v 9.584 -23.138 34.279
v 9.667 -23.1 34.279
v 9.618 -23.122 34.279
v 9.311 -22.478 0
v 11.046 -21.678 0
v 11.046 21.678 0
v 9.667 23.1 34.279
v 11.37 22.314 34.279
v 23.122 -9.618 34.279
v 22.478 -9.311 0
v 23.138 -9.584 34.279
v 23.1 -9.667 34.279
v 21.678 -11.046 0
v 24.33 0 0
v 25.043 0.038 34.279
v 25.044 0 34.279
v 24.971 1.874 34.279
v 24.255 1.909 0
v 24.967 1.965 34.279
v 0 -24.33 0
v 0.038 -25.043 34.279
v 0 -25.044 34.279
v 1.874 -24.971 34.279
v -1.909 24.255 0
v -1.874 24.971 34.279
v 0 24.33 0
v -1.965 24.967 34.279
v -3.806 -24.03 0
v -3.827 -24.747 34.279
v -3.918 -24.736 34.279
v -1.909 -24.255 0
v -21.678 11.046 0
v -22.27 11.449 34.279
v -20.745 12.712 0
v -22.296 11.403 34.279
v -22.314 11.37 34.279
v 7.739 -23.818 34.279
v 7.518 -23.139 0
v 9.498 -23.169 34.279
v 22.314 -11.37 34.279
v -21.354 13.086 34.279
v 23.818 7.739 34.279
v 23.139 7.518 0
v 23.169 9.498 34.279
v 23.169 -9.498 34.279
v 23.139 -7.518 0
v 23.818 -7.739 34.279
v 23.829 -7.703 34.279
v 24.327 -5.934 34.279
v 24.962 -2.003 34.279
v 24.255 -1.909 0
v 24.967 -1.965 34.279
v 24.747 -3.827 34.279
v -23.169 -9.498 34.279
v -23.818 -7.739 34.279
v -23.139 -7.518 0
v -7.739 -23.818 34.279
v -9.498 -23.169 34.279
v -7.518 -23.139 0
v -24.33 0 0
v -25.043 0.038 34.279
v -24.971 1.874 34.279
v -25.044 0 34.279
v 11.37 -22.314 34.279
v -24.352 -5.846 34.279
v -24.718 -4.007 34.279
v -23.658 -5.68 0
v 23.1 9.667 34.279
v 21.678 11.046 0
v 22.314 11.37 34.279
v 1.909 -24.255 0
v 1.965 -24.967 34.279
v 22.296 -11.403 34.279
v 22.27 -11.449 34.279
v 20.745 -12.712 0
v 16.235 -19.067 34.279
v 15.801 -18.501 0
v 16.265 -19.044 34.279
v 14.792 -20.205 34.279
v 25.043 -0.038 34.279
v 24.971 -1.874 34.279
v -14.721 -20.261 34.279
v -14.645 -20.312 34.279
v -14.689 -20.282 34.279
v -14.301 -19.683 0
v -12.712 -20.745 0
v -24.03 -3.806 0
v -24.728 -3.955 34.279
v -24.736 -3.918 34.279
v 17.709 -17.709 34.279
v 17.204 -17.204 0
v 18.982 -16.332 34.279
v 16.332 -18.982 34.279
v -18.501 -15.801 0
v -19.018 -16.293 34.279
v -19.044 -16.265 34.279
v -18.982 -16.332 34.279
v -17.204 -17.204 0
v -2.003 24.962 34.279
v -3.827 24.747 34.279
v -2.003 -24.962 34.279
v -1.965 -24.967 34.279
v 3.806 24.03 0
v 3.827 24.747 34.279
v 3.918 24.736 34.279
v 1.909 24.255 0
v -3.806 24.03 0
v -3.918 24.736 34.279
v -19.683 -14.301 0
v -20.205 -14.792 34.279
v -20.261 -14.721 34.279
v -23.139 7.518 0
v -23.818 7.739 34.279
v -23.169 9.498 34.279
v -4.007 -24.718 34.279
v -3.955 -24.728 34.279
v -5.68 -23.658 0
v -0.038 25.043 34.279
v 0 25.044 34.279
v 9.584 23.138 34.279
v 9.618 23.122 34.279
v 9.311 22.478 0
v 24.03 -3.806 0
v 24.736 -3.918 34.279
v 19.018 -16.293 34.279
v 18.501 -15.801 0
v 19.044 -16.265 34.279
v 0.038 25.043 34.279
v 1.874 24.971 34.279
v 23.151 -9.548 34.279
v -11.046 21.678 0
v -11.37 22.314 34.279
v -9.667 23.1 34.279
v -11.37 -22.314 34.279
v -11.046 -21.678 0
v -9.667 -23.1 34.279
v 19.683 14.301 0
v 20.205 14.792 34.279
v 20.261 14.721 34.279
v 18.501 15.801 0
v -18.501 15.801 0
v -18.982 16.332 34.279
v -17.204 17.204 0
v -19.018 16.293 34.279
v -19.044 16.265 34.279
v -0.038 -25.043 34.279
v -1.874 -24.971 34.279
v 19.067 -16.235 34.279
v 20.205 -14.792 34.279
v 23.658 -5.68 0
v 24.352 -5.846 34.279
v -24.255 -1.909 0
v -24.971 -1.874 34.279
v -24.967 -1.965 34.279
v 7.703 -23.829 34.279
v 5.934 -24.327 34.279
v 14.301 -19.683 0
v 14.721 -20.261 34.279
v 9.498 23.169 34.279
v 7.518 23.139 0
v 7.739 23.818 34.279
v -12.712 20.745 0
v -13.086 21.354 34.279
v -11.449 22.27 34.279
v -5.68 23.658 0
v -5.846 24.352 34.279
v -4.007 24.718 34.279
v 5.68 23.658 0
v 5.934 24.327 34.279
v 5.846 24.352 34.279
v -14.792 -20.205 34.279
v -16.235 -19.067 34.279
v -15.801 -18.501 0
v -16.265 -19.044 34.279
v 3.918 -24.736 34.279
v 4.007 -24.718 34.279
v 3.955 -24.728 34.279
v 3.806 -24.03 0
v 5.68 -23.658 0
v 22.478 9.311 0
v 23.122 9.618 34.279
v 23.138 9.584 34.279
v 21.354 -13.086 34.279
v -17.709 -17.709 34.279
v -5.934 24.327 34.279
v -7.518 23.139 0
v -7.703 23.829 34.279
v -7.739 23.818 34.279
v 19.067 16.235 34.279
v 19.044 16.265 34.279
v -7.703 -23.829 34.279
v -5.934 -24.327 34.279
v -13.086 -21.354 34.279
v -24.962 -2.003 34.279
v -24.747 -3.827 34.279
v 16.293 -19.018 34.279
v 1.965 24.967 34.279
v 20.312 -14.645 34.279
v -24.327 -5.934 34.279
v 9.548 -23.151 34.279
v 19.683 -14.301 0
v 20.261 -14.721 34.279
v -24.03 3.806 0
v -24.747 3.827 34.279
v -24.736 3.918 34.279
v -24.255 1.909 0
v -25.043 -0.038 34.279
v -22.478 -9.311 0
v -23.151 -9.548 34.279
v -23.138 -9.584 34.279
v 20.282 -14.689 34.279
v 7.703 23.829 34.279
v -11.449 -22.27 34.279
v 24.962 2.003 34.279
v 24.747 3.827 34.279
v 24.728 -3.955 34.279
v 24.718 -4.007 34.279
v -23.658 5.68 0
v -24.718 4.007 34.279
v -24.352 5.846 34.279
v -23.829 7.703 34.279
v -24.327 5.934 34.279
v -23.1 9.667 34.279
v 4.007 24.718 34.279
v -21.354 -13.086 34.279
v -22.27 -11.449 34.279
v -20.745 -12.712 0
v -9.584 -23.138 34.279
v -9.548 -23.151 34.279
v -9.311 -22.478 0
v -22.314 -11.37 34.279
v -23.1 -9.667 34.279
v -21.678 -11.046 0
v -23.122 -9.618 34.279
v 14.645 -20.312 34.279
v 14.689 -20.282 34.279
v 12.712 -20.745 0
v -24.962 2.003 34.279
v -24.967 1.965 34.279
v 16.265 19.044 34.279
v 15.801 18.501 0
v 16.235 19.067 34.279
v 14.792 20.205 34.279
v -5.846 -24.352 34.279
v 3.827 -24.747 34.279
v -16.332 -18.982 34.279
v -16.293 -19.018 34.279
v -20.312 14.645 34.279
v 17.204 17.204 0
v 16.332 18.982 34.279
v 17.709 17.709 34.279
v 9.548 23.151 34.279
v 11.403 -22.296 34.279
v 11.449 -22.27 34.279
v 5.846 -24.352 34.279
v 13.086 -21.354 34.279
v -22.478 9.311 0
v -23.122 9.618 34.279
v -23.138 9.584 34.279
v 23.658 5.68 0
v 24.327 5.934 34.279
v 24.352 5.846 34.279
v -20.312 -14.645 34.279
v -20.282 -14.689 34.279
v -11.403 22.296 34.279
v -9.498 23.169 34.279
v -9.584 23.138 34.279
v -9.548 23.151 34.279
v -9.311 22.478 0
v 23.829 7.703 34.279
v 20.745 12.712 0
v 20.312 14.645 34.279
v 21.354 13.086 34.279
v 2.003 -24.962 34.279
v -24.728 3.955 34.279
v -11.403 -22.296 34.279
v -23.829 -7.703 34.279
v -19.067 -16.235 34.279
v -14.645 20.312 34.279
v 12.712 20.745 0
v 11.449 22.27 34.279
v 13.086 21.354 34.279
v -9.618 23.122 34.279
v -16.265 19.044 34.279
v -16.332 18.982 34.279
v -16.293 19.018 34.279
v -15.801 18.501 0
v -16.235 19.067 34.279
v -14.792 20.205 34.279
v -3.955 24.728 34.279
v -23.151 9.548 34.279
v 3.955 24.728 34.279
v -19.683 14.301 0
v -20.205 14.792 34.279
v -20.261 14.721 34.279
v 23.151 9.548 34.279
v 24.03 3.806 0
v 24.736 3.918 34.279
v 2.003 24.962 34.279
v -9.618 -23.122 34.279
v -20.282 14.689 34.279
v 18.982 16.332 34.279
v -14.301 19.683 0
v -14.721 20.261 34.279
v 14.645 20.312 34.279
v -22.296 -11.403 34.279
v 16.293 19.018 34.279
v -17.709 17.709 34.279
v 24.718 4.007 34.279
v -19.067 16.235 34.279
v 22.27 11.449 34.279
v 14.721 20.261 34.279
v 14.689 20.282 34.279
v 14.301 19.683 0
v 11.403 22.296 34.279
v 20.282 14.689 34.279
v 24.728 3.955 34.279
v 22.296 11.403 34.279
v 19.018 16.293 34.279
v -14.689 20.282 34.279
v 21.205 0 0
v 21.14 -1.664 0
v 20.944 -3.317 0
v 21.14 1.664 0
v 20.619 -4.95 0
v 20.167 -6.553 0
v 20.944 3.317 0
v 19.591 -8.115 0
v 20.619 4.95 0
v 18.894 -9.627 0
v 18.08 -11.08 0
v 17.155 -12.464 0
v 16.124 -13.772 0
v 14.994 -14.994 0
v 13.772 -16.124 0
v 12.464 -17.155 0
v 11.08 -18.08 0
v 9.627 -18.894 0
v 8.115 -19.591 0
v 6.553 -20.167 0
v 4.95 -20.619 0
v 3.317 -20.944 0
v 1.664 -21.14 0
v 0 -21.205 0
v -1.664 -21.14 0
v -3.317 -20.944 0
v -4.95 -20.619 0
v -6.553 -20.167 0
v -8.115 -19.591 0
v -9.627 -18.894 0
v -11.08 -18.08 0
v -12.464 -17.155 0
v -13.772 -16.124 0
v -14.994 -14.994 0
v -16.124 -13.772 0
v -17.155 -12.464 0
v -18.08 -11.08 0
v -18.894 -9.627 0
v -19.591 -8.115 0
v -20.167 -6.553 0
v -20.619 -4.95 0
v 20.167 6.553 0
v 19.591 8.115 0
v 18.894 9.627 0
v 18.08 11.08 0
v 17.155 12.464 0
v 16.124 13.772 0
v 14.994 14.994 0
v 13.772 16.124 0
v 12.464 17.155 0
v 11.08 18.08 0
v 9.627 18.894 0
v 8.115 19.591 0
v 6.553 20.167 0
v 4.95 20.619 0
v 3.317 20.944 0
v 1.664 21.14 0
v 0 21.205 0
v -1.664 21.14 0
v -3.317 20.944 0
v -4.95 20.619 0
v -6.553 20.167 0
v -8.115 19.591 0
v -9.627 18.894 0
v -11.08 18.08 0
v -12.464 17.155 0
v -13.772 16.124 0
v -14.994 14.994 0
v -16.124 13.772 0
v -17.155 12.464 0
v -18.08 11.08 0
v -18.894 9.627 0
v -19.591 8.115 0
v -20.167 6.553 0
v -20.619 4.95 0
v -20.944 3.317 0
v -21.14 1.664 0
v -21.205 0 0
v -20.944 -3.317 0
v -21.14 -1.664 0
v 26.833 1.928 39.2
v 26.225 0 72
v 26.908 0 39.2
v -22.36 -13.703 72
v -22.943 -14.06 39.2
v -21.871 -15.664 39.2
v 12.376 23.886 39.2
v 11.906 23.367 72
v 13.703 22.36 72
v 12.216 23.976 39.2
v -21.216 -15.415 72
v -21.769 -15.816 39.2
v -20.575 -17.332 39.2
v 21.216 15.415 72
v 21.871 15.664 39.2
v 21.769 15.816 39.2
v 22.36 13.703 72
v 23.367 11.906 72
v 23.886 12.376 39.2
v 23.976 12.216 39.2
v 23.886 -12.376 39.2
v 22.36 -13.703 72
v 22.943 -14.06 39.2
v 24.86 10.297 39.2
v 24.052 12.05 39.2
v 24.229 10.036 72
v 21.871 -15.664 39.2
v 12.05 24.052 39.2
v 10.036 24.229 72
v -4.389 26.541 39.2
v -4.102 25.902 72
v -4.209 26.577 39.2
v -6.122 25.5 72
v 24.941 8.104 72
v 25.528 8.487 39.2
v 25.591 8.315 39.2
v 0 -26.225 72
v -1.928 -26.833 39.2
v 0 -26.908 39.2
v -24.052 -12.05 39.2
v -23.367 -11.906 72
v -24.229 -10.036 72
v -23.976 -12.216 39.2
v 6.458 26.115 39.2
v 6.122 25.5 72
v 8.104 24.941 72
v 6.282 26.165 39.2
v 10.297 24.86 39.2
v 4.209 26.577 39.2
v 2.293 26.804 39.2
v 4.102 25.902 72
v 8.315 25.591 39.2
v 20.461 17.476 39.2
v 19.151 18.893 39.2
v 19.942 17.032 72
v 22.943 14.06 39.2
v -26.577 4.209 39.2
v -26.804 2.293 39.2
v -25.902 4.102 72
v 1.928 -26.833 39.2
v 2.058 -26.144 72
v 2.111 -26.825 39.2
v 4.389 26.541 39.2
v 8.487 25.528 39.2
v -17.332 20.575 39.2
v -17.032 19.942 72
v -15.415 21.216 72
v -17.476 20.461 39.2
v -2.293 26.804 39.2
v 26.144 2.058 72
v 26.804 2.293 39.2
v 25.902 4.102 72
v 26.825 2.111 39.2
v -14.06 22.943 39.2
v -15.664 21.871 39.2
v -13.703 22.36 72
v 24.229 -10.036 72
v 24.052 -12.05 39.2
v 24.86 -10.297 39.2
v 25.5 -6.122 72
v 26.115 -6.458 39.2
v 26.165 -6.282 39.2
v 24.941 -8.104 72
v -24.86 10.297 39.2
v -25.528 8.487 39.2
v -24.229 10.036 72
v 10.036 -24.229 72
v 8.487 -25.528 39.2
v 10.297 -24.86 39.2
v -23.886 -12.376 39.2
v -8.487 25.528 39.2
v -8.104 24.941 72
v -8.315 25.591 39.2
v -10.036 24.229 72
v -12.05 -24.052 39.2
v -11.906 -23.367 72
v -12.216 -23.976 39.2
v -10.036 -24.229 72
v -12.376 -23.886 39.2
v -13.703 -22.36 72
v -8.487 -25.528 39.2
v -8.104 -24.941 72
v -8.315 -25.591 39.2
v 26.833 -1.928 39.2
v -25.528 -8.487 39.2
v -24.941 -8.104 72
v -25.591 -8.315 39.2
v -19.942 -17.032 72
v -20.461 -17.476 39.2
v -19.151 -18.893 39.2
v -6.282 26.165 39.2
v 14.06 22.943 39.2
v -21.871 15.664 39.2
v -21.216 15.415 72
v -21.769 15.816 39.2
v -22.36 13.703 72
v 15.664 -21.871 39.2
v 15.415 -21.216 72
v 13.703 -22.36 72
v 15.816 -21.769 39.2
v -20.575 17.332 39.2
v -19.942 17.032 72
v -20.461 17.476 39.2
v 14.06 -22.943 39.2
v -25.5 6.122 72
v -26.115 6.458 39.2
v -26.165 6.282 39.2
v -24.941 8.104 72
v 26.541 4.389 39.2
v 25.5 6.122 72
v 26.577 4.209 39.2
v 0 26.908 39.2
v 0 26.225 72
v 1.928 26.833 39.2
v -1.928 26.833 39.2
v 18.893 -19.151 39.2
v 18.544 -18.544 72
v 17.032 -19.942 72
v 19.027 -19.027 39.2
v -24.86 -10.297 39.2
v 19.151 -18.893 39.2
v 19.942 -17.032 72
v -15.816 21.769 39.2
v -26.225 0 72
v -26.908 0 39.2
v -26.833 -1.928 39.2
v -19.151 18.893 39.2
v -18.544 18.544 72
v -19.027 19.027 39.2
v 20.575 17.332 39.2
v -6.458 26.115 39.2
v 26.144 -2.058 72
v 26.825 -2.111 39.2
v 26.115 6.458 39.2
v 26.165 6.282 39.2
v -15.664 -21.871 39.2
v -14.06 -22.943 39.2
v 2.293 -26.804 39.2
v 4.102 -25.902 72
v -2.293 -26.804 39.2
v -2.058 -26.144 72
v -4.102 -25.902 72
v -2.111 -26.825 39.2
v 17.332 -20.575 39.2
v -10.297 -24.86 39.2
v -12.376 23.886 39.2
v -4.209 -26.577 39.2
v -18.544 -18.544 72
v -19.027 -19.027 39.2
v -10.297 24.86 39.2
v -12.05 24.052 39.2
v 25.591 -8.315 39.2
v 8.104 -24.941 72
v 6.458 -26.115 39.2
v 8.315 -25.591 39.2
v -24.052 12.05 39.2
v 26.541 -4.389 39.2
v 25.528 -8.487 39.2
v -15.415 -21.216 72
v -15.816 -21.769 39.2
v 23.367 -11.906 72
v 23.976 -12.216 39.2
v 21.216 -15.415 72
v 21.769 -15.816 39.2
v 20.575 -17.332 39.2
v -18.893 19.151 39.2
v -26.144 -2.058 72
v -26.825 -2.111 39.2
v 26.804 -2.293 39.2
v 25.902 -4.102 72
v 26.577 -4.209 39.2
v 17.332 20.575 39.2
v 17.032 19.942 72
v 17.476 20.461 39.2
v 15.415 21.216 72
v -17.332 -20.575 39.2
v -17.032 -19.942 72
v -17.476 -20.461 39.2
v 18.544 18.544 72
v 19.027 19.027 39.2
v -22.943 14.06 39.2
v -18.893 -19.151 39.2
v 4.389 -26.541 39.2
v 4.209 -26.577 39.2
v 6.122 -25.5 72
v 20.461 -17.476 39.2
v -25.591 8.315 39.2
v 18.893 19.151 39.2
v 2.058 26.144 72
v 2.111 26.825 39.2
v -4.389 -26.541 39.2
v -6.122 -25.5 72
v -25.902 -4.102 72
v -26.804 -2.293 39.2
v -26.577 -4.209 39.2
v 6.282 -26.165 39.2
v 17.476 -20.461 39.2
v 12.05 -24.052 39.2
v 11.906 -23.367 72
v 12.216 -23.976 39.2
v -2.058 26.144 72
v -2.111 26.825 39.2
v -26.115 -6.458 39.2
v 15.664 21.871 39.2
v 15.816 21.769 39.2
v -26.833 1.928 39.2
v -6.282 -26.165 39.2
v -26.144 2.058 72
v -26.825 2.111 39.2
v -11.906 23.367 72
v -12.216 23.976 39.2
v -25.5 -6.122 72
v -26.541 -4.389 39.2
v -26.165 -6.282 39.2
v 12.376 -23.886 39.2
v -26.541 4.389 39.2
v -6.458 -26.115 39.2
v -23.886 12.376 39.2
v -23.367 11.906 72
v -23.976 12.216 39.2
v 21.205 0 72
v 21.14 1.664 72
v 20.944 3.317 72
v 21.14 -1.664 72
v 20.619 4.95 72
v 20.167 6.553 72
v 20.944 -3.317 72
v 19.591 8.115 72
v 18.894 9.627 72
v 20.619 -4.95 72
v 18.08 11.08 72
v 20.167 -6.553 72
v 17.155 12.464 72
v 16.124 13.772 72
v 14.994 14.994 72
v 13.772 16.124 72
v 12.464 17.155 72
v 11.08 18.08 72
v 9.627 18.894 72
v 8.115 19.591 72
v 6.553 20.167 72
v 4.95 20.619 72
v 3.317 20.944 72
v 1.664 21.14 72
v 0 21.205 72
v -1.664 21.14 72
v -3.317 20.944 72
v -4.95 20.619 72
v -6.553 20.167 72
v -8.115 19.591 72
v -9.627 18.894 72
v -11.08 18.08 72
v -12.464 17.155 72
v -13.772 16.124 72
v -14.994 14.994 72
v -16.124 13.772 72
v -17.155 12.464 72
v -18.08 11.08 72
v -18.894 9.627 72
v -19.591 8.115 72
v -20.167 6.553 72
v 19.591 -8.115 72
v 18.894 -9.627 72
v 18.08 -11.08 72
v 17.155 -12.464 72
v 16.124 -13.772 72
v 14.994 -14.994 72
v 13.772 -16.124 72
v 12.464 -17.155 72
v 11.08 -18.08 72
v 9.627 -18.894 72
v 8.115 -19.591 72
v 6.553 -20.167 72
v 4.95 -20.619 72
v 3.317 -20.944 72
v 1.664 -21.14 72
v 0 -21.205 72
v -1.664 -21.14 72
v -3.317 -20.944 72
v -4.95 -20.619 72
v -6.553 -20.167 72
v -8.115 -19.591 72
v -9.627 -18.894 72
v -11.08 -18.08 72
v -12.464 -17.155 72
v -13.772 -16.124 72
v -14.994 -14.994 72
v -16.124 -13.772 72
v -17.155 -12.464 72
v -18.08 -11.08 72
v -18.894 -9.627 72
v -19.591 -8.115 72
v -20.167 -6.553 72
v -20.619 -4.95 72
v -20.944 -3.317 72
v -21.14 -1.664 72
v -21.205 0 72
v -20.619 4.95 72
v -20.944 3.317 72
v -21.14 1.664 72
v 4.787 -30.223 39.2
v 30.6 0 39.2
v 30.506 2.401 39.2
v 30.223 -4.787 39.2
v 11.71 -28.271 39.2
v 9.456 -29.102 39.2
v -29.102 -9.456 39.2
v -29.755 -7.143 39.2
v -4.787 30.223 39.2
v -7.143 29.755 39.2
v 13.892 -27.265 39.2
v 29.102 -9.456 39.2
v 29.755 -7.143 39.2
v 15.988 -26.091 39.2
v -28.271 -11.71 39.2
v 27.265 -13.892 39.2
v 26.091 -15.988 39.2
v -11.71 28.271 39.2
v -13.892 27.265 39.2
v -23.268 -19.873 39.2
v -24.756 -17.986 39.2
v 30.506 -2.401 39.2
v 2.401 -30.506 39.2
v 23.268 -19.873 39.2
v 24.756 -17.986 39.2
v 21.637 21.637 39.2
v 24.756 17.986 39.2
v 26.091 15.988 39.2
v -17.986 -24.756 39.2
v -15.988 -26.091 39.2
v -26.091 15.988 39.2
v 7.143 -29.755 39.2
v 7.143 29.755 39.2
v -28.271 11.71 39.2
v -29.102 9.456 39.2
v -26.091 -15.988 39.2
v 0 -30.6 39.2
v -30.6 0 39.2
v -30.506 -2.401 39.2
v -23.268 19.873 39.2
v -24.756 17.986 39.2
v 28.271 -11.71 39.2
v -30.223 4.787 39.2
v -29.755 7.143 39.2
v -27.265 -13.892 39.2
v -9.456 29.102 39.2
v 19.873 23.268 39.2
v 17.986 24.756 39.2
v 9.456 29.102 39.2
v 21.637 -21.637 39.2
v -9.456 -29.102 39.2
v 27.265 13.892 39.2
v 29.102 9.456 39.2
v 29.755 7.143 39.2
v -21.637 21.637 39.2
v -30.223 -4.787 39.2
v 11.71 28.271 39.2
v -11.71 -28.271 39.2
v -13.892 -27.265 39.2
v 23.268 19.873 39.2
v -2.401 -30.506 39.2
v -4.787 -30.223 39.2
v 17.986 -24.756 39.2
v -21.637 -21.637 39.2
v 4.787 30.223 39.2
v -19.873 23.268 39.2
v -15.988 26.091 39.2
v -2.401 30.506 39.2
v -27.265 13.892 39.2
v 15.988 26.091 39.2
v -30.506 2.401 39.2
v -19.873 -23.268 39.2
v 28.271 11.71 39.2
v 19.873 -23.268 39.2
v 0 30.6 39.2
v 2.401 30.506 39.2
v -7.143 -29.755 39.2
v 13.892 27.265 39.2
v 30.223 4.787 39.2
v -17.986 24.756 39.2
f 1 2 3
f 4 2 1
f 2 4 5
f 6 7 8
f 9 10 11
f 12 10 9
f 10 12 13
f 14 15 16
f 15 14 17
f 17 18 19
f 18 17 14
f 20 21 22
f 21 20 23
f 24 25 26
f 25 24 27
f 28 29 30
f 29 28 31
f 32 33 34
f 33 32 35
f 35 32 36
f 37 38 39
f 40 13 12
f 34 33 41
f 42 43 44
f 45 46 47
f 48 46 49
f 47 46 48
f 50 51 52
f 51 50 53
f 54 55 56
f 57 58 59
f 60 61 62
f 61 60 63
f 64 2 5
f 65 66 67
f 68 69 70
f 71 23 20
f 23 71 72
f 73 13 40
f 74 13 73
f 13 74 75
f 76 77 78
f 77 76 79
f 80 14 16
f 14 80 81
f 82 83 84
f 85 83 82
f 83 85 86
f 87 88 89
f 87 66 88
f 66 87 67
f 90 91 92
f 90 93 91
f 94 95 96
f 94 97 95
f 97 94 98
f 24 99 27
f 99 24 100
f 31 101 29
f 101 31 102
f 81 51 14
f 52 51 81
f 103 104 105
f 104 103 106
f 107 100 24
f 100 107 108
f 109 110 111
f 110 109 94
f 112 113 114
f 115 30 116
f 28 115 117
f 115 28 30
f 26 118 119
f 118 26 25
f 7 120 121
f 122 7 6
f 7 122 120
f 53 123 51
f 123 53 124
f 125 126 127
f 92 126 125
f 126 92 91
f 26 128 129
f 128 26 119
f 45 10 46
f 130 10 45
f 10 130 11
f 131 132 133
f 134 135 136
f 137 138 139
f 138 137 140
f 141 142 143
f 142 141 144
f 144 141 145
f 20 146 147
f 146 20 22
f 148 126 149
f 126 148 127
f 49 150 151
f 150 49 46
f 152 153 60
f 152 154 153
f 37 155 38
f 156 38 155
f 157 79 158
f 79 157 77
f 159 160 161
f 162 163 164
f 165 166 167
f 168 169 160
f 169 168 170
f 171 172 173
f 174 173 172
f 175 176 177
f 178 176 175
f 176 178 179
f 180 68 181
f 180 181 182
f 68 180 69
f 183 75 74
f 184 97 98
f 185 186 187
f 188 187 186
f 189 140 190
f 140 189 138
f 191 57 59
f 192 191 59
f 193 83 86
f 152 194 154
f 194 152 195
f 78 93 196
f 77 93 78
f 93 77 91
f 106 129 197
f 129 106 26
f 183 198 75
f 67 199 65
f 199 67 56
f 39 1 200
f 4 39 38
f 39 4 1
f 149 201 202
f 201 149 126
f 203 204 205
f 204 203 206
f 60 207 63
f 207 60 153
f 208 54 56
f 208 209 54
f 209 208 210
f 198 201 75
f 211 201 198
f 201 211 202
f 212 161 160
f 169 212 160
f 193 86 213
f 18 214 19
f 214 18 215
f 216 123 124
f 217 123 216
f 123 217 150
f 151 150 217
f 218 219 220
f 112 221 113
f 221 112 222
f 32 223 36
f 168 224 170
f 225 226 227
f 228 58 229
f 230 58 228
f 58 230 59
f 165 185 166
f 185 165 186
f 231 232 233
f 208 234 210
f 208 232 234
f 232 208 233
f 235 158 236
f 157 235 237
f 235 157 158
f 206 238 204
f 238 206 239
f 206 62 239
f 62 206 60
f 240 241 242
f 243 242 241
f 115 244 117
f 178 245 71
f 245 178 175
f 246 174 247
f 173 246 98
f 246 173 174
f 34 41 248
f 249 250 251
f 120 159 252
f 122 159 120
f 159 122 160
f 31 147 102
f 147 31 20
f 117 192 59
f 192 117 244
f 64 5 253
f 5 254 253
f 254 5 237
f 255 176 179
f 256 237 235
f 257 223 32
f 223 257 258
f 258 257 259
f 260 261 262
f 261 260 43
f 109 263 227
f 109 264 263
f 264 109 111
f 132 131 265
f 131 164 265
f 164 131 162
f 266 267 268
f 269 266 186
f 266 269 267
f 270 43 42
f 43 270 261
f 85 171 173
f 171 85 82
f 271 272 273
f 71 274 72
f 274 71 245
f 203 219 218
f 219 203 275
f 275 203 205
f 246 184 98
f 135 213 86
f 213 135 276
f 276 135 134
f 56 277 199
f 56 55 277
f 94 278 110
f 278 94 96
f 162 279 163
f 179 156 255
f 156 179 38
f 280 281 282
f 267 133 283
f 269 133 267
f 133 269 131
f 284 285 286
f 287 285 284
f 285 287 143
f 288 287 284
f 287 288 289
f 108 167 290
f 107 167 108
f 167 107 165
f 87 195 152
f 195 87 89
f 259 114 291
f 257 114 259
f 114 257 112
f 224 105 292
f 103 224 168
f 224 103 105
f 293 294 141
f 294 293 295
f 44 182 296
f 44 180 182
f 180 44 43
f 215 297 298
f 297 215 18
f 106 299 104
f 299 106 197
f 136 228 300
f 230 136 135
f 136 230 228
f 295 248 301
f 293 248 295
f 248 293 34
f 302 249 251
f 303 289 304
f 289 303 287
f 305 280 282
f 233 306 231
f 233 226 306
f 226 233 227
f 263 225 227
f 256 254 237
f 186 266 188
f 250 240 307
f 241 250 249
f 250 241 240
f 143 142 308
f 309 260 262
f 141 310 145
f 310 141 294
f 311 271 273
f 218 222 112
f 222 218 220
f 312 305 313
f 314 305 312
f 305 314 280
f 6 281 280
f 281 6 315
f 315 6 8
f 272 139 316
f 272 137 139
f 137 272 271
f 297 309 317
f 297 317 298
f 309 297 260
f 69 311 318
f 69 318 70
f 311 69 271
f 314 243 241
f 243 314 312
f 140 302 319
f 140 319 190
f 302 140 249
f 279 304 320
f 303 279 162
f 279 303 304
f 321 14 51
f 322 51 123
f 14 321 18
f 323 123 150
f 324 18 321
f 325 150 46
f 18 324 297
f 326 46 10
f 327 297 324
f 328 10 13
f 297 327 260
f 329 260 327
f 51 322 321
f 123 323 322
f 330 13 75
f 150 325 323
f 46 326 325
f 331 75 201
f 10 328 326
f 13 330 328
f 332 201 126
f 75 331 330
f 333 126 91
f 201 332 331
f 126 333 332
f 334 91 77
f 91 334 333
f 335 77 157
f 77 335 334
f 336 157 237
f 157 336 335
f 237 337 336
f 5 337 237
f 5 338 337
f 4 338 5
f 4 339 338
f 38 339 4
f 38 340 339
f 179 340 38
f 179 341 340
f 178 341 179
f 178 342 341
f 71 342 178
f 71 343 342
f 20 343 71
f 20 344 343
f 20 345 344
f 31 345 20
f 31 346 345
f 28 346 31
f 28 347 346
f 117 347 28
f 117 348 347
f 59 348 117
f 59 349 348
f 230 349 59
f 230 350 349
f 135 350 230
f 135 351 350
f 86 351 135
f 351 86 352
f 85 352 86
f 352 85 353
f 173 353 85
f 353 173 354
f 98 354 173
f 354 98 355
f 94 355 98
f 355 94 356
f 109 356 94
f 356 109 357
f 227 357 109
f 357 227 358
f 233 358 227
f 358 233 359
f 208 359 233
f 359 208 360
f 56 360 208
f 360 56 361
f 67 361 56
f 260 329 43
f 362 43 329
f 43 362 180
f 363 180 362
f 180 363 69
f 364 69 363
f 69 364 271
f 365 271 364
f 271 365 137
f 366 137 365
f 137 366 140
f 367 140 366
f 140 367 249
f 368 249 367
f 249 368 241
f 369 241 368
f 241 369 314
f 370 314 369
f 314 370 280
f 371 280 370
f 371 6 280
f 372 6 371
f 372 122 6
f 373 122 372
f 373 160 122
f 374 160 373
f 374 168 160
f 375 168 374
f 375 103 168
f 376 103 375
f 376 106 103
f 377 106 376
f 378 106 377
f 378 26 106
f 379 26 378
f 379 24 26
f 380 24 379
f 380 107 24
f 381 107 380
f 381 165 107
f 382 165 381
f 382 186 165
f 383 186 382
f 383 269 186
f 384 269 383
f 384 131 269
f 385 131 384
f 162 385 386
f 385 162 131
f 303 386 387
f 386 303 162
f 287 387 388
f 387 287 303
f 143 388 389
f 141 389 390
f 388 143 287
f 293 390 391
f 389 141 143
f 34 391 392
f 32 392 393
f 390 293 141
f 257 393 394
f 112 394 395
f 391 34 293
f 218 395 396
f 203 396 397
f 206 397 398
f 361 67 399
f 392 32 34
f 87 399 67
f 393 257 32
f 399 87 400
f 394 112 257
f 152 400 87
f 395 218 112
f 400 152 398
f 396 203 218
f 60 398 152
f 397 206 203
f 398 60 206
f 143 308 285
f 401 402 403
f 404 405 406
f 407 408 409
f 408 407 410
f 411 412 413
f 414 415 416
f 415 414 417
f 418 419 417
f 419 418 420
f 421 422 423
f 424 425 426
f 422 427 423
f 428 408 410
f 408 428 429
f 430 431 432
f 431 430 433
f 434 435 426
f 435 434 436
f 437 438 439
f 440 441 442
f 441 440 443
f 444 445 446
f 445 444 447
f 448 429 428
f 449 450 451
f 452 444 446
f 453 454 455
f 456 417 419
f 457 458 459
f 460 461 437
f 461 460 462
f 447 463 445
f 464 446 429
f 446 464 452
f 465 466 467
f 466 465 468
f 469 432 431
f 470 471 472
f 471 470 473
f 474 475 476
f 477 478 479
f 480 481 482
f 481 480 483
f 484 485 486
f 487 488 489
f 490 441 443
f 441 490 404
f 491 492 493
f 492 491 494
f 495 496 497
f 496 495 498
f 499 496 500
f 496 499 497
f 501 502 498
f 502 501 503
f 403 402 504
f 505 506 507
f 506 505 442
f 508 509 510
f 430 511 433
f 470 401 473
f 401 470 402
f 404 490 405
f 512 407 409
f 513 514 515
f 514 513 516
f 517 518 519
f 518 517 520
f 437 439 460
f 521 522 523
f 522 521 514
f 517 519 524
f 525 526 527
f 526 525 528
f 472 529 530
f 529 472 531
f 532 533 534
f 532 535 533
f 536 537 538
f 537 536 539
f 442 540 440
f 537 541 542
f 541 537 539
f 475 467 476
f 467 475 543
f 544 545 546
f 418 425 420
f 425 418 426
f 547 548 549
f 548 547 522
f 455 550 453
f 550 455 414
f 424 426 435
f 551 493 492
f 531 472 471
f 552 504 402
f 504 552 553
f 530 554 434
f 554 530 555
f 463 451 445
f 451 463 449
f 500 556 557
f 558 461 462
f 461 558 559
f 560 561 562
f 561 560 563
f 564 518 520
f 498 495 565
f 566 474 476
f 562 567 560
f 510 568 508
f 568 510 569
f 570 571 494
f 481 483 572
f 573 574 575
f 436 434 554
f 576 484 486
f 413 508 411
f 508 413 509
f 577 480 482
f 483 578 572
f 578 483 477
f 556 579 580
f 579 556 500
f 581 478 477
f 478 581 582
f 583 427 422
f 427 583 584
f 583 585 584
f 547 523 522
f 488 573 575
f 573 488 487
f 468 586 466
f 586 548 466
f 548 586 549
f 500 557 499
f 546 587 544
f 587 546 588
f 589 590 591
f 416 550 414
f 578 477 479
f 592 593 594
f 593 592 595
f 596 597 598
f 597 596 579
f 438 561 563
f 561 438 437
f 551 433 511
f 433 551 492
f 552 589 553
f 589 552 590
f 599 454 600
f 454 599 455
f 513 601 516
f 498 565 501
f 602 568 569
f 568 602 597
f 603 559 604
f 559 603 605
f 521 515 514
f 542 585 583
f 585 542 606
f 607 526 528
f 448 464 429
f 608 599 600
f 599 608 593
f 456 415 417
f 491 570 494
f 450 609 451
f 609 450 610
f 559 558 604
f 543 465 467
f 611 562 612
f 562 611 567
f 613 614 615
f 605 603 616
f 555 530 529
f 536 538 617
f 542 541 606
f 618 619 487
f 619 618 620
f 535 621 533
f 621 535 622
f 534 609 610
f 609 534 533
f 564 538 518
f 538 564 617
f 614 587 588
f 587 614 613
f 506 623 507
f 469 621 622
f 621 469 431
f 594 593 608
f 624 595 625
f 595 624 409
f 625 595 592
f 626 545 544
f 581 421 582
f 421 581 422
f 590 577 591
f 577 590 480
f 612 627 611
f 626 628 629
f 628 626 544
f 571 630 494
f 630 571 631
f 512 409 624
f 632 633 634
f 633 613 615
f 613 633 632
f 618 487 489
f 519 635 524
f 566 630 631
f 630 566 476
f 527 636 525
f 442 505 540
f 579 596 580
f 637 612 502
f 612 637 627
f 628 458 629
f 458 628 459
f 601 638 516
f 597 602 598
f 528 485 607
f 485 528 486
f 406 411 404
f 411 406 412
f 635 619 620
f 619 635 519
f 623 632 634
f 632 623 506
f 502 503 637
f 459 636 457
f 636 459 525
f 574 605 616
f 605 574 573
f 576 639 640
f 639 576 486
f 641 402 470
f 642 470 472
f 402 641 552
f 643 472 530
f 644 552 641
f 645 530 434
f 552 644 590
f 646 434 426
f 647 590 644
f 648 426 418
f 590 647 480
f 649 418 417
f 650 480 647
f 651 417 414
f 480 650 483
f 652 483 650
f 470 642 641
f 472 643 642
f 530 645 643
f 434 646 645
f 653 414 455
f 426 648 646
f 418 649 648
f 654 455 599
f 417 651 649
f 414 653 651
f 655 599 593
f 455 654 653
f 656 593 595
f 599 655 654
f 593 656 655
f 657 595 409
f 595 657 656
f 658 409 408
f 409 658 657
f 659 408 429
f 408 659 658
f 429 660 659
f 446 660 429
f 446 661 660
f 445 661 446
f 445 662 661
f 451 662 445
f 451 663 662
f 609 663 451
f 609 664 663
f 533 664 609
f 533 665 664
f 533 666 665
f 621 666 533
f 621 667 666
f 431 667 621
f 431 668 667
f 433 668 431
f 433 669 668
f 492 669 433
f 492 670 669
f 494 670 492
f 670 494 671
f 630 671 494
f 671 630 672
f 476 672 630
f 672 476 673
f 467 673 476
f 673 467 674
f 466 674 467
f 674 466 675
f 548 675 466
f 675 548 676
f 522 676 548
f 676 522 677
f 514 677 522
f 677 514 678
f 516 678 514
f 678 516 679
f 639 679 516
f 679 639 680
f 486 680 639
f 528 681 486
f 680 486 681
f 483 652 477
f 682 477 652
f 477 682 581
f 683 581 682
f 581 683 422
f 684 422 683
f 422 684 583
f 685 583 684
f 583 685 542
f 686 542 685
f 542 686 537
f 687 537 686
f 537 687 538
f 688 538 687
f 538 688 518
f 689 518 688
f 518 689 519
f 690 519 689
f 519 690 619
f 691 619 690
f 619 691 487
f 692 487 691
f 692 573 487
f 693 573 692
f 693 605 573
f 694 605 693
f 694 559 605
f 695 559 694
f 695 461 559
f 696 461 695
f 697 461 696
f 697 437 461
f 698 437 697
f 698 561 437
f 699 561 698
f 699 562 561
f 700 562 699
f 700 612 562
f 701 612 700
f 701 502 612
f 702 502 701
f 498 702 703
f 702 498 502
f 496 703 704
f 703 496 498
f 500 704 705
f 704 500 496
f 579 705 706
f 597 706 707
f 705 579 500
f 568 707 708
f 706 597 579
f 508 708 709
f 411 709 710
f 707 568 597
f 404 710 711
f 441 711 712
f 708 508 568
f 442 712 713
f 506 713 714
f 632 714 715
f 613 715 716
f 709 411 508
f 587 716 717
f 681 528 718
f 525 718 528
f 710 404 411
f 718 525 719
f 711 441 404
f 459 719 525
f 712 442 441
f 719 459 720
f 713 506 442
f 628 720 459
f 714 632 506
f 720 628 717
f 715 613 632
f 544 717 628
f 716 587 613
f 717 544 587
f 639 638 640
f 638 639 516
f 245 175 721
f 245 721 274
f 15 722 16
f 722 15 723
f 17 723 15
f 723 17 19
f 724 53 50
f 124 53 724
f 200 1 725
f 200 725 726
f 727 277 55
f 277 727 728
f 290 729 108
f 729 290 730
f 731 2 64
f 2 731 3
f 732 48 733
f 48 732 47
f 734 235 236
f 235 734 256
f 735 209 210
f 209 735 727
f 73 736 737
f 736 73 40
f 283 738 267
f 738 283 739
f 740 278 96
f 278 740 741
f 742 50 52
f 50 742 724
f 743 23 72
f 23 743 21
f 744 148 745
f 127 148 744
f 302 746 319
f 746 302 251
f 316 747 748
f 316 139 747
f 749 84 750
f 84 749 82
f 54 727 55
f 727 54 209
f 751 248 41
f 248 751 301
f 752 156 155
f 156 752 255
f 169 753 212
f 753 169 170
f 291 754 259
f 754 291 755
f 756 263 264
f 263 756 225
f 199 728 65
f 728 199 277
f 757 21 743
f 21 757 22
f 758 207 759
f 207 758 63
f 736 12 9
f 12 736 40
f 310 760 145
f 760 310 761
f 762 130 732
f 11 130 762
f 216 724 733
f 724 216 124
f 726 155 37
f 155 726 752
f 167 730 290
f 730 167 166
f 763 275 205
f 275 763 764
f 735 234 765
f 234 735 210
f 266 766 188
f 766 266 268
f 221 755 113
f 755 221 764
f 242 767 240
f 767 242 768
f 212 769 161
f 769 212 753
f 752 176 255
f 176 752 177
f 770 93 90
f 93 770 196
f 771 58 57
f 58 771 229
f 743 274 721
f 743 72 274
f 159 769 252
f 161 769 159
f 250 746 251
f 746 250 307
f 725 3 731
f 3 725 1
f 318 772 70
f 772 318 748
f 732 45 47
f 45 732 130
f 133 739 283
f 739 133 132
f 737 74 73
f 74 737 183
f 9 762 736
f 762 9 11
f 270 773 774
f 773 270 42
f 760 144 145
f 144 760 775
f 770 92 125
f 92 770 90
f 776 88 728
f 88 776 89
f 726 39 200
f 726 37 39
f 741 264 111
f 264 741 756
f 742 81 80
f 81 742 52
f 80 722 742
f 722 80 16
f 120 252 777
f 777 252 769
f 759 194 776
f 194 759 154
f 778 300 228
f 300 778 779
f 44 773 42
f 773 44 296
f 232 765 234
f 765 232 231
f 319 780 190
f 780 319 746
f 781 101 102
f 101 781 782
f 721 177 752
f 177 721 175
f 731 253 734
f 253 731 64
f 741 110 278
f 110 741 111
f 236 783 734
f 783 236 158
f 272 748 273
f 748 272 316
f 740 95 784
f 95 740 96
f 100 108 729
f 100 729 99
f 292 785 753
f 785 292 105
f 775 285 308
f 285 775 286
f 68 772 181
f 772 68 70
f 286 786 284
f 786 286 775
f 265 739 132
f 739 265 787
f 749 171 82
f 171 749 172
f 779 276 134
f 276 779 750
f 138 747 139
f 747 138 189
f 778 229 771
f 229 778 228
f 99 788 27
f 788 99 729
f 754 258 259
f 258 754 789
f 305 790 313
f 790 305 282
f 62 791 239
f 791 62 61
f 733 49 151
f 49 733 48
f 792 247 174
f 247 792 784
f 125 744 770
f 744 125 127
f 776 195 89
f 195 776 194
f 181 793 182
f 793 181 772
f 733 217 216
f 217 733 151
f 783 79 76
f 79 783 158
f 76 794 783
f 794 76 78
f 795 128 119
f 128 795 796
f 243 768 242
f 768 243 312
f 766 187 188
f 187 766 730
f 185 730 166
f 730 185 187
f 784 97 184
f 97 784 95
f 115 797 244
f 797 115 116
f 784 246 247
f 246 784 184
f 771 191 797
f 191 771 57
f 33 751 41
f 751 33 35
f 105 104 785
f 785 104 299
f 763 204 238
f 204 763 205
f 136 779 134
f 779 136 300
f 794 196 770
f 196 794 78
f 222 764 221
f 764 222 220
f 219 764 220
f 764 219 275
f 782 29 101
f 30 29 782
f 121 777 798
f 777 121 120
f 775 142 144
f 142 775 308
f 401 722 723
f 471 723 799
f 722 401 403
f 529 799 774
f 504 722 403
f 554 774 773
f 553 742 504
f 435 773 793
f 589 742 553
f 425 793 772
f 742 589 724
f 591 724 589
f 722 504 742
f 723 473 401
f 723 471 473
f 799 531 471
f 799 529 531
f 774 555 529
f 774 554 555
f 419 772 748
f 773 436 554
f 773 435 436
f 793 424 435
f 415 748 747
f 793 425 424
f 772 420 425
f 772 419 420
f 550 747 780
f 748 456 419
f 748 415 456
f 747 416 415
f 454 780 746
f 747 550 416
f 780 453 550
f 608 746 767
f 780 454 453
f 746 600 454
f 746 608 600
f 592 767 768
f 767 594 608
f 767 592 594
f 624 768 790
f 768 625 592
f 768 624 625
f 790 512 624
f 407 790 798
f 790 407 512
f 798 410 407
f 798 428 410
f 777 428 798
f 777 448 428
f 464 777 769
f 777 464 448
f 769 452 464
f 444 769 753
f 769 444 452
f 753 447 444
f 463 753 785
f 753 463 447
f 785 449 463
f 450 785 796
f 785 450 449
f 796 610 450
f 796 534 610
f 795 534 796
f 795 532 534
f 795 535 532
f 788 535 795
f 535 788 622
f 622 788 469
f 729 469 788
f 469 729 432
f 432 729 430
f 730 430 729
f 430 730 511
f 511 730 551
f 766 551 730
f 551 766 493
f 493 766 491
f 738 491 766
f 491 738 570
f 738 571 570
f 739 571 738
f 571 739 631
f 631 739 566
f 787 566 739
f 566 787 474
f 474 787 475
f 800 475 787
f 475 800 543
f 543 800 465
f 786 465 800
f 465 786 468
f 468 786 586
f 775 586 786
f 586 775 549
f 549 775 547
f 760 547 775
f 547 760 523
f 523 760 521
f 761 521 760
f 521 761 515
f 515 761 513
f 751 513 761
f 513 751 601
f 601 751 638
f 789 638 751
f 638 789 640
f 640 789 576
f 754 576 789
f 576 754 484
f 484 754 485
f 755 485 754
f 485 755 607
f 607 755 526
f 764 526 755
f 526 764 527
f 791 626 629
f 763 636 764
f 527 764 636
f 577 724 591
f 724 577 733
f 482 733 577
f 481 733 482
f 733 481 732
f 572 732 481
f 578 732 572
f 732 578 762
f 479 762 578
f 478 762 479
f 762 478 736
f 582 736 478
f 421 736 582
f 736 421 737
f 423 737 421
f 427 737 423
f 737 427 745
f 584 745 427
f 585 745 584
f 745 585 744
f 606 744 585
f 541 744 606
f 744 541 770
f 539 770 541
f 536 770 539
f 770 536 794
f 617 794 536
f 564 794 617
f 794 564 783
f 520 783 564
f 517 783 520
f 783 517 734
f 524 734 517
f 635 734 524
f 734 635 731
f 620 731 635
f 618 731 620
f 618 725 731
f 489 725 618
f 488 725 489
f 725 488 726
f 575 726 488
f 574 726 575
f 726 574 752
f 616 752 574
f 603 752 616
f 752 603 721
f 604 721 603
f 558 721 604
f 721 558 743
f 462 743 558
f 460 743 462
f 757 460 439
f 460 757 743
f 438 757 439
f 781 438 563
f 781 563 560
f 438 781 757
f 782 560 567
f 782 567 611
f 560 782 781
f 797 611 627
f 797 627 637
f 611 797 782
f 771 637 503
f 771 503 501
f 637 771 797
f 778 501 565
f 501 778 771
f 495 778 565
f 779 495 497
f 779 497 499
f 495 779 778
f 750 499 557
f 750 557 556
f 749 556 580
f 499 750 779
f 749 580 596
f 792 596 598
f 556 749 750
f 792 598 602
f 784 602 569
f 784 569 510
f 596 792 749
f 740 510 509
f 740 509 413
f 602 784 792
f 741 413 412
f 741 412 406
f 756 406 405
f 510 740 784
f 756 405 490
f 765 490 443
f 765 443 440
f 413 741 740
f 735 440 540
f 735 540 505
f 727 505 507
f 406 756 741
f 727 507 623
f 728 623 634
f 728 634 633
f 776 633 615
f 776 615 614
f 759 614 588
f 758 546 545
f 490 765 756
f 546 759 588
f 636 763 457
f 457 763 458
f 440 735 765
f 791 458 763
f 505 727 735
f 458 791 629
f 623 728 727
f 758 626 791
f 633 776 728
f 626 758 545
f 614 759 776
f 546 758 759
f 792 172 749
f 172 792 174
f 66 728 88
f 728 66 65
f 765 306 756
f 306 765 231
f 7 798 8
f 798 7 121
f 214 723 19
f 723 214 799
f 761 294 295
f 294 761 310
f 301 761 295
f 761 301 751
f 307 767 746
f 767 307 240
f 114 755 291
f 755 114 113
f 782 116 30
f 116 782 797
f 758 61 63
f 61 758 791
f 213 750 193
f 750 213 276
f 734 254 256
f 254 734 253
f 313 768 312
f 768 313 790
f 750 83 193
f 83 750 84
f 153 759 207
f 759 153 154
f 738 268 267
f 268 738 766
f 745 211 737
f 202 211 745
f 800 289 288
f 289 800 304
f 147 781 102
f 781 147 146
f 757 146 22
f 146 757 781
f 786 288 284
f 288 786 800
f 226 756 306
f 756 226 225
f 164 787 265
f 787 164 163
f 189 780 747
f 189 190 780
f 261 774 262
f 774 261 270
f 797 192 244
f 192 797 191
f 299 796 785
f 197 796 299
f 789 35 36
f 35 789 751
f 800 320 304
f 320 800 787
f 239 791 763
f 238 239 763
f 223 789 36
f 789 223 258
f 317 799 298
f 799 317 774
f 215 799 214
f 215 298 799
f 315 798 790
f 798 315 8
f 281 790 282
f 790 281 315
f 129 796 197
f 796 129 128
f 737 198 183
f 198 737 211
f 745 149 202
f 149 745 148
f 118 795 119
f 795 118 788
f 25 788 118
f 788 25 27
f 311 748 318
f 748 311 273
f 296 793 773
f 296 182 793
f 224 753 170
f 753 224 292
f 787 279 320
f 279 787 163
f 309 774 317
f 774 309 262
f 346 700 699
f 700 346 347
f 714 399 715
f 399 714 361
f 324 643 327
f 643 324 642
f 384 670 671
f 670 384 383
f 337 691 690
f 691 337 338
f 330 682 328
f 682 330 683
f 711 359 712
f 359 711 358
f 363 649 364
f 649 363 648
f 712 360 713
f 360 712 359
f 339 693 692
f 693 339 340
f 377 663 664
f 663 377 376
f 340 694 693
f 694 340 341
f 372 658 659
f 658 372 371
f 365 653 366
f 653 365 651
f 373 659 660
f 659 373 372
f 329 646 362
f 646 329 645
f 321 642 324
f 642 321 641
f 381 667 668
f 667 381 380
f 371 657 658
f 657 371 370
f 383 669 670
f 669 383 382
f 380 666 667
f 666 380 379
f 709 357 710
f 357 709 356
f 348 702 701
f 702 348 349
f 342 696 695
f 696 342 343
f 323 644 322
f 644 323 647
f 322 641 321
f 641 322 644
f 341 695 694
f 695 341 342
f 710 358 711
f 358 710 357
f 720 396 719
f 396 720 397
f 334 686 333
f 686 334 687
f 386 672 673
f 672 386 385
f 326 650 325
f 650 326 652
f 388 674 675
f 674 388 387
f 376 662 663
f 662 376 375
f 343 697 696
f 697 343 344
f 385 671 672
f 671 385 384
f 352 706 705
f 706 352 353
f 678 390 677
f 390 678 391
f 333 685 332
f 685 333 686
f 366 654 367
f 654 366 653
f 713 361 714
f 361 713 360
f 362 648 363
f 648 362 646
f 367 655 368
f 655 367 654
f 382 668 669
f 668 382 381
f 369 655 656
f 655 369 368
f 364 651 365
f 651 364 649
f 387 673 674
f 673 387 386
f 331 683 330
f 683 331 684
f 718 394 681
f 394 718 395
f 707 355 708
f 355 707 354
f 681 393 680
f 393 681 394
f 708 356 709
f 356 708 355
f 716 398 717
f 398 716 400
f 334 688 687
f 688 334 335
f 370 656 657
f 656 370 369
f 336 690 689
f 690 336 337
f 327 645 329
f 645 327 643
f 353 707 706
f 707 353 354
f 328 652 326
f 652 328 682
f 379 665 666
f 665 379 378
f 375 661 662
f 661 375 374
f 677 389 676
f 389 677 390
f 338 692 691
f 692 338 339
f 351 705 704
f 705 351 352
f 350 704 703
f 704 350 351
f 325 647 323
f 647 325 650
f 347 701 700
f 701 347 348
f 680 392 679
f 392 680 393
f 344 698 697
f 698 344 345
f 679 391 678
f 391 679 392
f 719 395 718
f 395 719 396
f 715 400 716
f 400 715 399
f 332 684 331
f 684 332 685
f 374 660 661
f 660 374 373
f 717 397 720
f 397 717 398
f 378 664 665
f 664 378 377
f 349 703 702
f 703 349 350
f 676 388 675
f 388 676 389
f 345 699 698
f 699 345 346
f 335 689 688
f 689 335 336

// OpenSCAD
// hose inner diameter [mm]
HID = 53.2;

// hose wall thickness [mm]
HWL = 4;

// receiving end inner diameter [mm]
RID = 49.41;

LENGTH = 36;
TAPER = 0.75;

$fn=80;

difference() {
  union() { 
    translate([0,0,0])  cylinder(h = LENGTH, d2 = RID+TAPER, d1 = RID-TAPER);
    translate([0,0,LENGTH])  cylinder(h = LENGTH, d2 = HID-TAPER, d1 = HID+TAPER);
    translate([0,0,LENGTH-1.8])  cylinder(h = 5, d2 = HID+2*HWL, d1 = RID+0.5);    
  }    
  translate([0,0,-1])  cylinder(h = 82, d = RID-7);
}
